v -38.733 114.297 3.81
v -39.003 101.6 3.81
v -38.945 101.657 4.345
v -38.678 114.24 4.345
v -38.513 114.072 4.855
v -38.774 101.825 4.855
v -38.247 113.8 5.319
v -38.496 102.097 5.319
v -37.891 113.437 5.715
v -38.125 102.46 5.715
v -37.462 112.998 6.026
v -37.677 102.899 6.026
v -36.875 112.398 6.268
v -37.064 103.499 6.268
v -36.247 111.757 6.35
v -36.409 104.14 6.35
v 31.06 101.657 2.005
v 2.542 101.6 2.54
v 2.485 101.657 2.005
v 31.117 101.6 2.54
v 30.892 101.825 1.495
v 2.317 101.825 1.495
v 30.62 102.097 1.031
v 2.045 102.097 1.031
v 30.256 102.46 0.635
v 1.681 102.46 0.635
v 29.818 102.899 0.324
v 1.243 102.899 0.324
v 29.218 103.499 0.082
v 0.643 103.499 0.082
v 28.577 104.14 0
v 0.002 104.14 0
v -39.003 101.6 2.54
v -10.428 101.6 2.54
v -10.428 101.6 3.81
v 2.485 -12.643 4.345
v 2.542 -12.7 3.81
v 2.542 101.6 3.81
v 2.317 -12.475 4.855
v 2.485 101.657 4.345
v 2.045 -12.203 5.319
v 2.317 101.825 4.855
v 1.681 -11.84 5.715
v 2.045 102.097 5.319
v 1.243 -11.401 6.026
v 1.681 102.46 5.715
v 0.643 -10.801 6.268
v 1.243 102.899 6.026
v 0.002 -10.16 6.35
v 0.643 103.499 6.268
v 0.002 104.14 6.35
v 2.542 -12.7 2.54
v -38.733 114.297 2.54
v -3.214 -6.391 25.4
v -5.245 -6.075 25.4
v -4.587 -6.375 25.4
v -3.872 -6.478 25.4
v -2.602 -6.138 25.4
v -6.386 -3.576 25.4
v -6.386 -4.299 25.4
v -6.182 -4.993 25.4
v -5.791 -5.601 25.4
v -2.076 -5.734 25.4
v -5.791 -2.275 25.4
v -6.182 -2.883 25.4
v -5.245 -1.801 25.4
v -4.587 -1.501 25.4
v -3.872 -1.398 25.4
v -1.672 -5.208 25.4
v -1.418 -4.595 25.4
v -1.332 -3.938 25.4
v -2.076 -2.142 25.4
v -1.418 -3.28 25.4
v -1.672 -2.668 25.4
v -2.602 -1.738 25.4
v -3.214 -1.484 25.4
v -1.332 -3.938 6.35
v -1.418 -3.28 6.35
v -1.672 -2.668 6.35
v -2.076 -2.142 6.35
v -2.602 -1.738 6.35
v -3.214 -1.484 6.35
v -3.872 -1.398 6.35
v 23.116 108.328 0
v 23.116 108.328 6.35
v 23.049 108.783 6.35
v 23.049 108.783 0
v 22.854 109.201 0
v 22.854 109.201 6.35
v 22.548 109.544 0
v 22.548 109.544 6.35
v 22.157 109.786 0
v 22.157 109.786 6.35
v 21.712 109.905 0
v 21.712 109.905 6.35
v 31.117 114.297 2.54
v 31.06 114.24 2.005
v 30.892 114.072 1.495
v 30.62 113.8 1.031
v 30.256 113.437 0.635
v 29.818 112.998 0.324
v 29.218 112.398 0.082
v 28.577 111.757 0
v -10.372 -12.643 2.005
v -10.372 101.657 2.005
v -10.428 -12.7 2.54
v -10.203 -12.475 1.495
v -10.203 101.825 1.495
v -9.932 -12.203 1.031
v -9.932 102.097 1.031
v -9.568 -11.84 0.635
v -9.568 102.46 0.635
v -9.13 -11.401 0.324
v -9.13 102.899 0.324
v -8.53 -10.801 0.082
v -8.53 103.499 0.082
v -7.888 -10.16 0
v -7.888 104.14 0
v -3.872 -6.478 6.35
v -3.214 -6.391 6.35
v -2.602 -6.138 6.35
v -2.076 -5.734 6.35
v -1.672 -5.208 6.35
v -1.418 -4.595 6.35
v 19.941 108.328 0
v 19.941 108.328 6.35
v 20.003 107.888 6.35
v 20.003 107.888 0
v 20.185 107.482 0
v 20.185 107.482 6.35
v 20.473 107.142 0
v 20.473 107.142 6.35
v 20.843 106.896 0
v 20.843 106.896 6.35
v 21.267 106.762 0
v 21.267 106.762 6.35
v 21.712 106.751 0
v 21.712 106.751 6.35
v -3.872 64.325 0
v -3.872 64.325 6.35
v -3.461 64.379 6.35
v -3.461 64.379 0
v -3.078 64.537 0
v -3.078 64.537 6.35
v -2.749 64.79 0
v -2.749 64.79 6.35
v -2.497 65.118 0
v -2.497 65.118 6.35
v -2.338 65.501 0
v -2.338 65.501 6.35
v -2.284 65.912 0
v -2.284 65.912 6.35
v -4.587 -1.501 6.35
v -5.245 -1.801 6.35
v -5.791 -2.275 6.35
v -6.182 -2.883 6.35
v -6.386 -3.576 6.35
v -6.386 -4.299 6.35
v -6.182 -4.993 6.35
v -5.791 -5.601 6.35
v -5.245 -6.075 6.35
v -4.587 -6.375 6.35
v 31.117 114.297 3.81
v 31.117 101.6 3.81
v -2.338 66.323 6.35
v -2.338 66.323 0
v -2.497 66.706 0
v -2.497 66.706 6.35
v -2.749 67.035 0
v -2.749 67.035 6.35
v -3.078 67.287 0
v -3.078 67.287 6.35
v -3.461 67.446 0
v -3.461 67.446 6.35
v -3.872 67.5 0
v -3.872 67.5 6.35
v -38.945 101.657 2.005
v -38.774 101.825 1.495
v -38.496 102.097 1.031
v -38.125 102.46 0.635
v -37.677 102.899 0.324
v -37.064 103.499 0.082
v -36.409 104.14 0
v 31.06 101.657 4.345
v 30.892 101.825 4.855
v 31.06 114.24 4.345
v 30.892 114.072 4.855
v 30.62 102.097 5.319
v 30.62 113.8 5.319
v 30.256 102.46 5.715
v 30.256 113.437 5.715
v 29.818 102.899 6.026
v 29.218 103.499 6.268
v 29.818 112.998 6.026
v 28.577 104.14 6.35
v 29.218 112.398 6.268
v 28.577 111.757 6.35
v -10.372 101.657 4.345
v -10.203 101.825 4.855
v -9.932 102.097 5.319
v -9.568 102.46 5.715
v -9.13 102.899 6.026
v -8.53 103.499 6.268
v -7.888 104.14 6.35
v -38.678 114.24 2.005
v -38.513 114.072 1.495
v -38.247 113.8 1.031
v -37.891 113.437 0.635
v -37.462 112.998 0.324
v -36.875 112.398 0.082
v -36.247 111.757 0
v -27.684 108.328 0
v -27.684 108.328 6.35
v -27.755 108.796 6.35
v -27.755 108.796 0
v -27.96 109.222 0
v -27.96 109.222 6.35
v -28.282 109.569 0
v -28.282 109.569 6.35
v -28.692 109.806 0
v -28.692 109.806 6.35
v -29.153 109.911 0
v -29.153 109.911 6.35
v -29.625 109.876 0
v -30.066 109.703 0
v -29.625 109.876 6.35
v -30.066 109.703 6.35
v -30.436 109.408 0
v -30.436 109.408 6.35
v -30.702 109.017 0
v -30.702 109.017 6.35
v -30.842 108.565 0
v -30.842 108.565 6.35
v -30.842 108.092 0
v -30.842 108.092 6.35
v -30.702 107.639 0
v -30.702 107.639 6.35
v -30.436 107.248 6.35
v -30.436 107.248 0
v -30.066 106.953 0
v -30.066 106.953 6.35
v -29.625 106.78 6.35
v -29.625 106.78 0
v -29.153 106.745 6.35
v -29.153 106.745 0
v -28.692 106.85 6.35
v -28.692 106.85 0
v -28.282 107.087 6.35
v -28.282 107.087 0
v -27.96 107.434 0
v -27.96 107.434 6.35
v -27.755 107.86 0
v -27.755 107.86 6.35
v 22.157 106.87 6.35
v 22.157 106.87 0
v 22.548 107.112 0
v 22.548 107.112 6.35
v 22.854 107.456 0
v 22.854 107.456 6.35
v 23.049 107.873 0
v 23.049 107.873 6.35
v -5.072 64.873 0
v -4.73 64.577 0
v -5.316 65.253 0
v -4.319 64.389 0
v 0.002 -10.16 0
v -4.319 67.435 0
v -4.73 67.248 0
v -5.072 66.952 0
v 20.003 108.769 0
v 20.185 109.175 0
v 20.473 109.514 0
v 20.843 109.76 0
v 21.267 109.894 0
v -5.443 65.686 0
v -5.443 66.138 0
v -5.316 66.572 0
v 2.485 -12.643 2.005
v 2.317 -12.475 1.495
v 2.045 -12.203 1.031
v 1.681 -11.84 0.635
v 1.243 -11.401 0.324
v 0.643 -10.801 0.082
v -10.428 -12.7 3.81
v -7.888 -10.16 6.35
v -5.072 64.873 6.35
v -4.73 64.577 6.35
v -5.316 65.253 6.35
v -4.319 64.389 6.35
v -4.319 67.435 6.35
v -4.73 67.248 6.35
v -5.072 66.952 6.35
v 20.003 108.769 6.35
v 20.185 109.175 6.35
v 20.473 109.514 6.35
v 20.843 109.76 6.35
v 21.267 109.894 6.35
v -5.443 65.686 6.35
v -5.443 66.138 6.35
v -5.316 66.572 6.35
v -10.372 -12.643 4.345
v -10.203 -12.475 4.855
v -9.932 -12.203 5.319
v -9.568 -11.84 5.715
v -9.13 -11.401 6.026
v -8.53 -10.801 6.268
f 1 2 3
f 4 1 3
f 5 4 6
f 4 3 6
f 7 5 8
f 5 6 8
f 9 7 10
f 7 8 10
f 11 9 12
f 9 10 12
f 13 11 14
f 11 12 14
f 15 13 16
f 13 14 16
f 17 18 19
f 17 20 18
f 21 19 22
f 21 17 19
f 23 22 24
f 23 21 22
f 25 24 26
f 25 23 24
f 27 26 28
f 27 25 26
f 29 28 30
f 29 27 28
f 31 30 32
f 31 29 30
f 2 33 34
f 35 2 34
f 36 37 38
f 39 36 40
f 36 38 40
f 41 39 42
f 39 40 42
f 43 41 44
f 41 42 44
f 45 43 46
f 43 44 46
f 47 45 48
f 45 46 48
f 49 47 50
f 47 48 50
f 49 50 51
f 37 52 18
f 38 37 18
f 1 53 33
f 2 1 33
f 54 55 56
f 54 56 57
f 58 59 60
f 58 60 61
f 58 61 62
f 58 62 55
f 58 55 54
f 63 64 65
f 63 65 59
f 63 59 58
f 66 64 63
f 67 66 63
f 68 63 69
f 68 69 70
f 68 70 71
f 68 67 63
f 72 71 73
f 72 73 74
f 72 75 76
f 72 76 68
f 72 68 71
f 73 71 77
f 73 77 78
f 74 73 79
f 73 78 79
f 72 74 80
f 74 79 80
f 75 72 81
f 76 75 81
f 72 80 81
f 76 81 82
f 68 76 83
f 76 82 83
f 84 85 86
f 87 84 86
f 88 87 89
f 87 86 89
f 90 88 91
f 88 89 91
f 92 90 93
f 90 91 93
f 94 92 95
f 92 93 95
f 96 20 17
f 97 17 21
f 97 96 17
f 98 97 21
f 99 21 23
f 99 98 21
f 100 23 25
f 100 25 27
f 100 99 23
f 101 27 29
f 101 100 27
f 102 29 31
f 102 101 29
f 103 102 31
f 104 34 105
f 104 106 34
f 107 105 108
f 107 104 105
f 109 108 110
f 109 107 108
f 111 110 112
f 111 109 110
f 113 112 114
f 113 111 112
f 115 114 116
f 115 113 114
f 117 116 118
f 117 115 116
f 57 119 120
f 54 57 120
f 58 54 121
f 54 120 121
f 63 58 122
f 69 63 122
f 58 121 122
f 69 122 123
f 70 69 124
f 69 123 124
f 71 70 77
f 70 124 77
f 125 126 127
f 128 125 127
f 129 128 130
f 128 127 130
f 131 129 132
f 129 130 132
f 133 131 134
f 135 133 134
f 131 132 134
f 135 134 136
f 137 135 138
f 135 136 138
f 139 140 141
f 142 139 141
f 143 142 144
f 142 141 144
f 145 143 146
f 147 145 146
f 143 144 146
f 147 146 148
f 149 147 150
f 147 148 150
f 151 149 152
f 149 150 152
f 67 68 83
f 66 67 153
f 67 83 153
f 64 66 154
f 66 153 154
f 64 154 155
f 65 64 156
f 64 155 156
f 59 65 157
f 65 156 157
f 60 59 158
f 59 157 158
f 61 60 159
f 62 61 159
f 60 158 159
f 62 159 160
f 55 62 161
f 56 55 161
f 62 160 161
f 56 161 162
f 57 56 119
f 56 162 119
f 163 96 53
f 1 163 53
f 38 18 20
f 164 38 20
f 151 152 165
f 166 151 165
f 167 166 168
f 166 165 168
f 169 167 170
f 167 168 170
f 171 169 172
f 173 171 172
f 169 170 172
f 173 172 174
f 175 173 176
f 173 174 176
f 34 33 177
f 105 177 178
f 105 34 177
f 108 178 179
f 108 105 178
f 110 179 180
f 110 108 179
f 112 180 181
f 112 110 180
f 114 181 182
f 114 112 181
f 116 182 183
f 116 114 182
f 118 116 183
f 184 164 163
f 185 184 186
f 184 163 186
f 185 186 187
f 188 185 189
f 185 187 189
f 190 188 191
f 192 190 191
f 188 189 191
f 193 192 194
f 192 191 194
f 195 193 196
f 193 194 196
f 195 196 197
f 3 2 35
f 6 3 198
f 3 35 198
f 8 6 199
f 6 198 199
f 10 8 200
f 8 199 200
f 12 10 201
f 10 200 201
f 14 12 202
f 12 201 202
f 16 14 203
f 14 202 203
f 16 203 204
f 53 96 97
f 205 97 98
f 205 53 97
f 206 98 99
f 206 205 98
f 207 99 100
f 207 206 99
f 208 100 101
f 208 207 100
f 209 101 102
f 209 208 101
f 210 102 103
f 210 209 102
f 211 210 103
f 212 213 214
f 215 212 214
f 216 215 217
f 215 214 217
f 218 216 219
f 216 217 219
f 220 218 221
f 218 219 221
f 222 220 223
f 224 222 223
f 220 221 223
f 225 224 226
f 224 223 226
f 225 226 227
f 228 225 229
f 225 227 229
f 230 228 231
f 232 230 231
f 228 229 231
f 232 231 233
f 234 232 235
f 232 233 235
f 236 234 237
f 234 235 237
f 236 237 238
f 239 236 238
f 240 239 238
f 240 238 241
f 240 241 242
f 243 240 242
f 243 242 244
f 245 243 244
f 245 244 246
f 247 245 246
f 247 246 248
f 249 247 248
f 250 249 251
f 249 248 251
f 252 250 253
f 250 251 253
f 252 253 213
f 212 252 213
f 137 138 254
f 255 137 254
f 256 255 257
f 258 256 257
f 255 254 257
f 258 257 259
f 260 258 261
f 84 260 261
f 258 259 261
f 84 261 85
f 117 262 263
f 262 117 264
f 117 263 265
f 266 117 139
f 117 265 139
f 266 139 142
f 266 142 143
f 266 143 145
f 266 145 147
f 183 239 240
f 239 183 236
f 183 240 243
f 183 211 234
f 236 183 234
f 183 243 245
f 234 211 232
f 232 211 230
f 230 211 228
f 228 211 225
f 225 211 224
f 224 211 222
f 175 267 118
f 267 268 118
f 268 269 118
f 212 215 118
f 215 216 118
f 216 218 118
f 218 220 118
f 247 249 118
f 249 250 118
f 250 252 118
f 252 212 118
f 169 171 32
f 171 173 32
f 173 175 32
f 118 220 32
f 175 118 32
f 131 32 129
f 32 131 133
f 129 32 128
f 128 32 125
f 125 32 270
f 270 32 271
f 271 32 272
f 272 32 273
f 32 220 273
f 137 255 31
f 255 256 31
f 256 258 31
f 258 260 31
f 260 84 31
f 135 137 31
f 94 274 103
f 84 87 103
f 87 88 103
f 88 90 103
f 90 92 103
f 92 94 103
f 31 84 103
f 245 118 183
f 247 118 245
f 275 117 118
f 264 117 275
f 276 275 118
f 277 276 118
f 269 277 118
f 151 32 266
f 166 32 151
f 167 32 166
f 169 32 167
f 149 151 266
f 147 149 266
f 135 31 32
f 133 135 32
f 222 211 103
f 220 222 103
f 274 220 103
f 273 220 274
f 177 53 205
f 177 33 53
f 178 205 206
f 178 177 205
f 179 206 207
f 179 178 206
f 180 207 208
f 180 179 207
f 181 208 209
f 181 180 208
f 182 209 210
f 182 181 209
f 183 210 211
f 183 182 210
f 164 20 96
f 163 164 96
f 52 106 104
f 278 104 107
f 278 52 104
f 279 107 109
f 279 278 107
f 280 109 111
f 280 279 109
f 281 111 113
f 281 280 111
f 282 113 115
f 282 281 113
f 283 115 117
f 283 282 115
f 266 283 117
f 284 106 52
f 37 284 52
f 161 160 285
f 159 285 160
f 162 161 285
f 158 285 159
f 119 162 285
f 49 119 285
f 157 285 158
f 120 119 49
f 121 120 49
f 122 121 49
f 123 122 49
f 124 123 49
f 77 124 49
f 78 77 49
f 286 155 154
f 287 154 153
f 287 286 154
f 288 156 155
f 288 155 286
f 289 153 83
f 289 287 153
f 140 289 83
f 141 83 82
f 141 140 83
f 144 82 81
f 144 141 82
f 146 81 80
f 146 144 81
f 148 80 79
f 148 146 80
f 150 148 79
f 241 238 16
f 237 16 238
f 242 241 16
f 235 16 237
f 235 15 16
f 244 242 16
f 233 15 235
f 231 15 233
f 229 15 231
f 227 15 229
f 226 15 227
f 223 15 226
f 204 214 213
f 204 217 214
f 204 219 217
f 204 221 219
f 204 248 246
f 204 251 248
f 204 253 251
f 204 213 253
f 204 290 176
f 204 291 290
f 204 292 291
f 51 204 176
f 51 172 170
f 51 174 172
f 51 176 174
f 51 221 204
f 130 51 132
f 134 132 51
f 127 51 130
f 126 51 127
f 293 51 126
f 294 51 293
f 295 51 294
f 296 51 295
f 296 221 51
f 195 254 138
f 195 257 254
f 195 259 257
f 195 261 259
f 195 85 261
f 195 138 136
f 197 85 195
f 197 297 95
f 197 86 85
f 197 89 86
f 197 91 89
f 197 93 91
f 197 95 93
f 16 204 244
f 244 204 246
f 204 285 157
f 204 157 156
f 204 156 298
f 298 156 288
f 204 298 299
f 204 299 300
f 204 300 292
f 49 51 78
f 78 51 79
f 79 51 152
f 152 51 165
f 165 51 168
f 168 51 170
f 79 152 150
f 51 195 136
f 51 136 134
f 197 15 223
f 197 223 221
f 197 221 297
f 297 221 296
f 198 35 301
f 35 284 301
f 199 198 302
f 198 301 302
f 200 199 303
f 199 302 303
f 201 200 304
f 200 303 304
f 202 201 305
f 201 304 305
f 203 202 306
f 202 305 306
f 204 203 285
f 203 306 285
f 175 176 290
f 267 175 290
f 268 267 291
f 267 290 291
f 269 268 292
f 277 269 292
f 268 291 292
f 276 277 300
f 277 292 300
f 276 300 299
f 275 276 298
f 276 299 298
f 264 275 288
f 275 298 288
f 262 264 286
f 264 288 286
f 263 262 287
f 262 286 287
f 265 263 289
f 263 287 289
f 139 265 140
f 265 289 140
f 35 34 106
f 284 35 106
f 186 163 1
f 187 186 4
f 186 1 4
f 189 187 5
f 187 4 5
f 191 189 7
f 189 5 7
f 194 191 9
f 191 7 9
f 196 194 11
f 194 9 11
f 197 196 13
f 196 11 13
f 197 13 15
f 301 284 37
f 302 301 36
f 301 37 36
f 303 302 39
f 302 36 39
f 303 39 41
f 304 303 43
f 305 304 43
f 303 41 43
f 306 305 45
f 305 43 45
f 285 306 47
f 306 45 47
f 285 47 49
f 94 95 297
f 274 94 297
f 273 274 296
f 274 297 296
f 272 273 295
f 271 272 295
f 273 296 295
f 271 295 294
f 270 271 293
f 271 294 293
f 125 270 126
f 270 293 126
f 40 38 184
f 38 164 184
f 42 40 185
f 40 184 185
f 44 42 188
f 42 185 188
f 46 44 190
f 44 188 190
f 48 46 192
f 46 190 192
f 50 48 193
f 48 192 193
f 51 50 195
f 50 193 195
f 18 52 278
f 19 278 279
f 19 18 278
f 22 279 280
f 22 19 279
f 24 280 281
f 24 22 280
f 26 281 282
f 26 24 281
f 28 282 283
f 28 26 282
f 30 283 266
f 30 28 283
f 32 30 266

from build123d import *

# Parameters (mm, degrees)
F1_DEPTH = 6.35
F3_R     = 2.54
F4_DEPTH = 6.35
F5_DEPTH = 6.35
F6_DEPTH = 6.35
F7_DEPTH = 19.05


with BuildPart() as f1:
    # F0 (on Top) → F1 (new body)
    with BuildSketch(Plane.XY):
        Polygon((31.1166602765, 114.2971263717), (-38.7333397235, 114.2971263717), (-39.0034913485, 101.6), (-10.4284913485, 101.6), (-10.4284913485, -12.7), (2.5416602765, -12.7), (2.5416602765, 101.6), (31.1166602765, 101.6), align=None)
    extrude(amount=F1_DEPTH)

    # F3
    f3_edges = [f1.edges().sort_by_distance(p)[0] for p in [
        (-24.715991, 101.6, 6.35),
        (-38.868416, 107.948563, 6.35),
        (-3.80834, 114.297126, 6.35),
        (16.82916, 101.6, 6.35),
        (31.11666, 107.948563, 6.35),
        (2.54166, 44.45, 6.35),
        (-10.428491, 44.45, 6.35),
        (-3.943416, -12.7, 6.35),
        (-24.715991, 101.6, 0),
        (-38.868416, 107.948563, 0),
        (-3.80834, 114.297126, 0),
        (16.82916, 101.6, 0),
        (31.11666, 107.948563, 0),
        (2.54166, 44.45, 0),
        (-10.428491, 44.45, 0),
        (-3.943416, -12.7, 0),
    ]]
    fillet(f3_edges, radius=F3_R)

    # F2 (on face) → F4 (cut)
    with BuildSketch(Plane.XY.offset(6.35)):
        with BuildLine():
            Line((-27.6843397235, 108.3281263717), (-29.2718397235, 108.3281263717))
            Line((-29.2718397235, 108.3281263717), (-30.8593397235, 108.3281263717))
            ThreePointArc((-30.8593397235, 108.3281263717), (-29.2718397235, 106.7406263717), (-27.6843397235, 108.3281263717))
        make_face()
        with BuildLine():
            Line((-30.8593397235, 108.3281263717), (-29.2718397235, 108.3281263717))
            Line((-29.2718397235, 108.3281263717), (-27.6843397235, 108.3281263717))
            ThreePointArc((-27.6843397235, 108.3281263717), (-29.2718397235, 109.9156263717), (-30.8593397235, 108.3281263717))
        make_face()
    extrude(amount=-F4_DEPTH, mode=Mode.SUBTRACT)

    # F2 (on face) → F5 (cut)
    with BuildSketch(Plane.XY.offset(6.35)):
        with BuildLine():
            ThreePointArc((21.7121915103, 109.904923364), (20.4726967133, 109.5139395597), (19.9406602765, 108.3281263717))
            Line((19.9406602765, 108.3281263717), (21.5281602765, 108.3281263717))
            Line((21.5281602765, 108.3281263717), (21.7121915103, 108.3281263717))
            Line((21.7121915103, 108.3281263717), (21.7121915103, 109.904923364))
        make_face()
        with BuildLine():
            ThreePointArc((23.1156602765, 108.3281263717), (22.7139734645, 109.3835899349), (21.7121915103, 109.904923364))
            Line((21.7121915103, 109.904923364), (21.7121915103, 108.3281263717))
            Line((21.7121915103, 108.3281263717), (23.1156602765, 108.3281263717))
        make_face()
        with BuildLine():
            Line((21.7121915103, 108.3281263717), (21.7121915103, 106.7513293794))
            ThreePointArc((21.7121915103, 106.7513293794), (22.7139734645, 107.2726628086), (23.1156602765, 108.3281263717))
            Line((23.1156602765, 108.3281263717), (21.7121915103, 108.3281263717))
        make_face()
        with BuildLine():
            Line((21.5281602765, 108.3281263717), (19.9406602765, 108.3281263717))
            ThreePointArc((19.9406602765, 108.3281263717), (20.4726967133, 107.1423131837), (21.7121915103, 106.7513293794))
            Line((21.7121915103, 106.7513293794), (21.7121915103, 108.3281263717))
            Line((21.7121915103, 108.3281263717), (21.5281602765, 108.3281263717))
        make_face()
    extrude(amount=-F5_DEPTH, mode=Mode.SUBTRACT)

    # F2 (on face) → F6 (cut)
    with BuildSketch(Plane.XY.offset(6.35)):
        with BuildLine():
            Line((-3.8718397235, 65.912123364), (-3.8718397235, 67.499623364))
            ThreePointArc((-3.8718397235, 67.499623364), (-5.4593397235, 65.912123364), (-3.8718397235, 64.324623364))
            Line((-3.8718397235, 64.324623364), (-3.8718397235, 65.912123364))
        make_face()
        with BuildLine():
            ThreePointArc((-2.2843397235, 65.912123364), (-2.7493077084, 67.0346553792), (-3.8718397235, 67.499623364))
            Line((-3.8718397235, 67.499623364), (-3.8718397235, 65.912123364))
            Line((-3.8718397235, 65.912123364), (-2.2843397235, 65.912123364))
        make_face()
        with BuildLine():
            ThreePointArc((-3.8718397235, 64.324623364), (-2.7493077084, 64.7895913489), (-2.2843397235, 65.912123364))
            Line((-2.2843397235, 65.912123364), (-3.8718397235, 65.912123364))
            Line((-3.8718397235, 65.912123364), (-3.8718397235, 64.324623364))
        make_face()
    extrude(amount=-F6_DEPTH, mode=Mode.SUBTRACT)

    # F2 (on face) → F7 (join)
    with BuildSketch(Plane.XY.offset(6.35)):
        with BuildLine():
            Line((-3.8718397235, -3.937876636), (-3.8718397235, -1.397876636))
            ThreePointArc((-3.8718397235, -1.397876636), (-6.4118397235, -3.937876636), (-3.8718397235, -6.477876636))
            Line((-3.8718397235, -6.477876636), (-3.8718397235, -3.937876636))
        make_face()
        with BuildLine():
            ThreePointArc((-1.3318397235, -3.937876636), (-2.0757884993, -2.1418254117), (-3.8718397235, -1.397876636))
            Line((-3.8718397235, -1.397876636), (-3.8718397235, -3.937876636))
            Line((-3.8718397235, -3.937876636), (-1.3318397235, -3.937876636))
        make_face()
        with BuildLine():
            Line((-1.3318397235, -3.937876636), (-3.8718397235, -3.937876636))
            Line((-3.8718397235, -3.937876636), (-3.8718397235, -6.477876636))
            ThreePointArc((-3.8718397235, -6.477876636), (-2.0757884993, -5.7339278602), (-1.3318397235, -3.937876636))
        make_face()
    extrude(amount=F7_DEPTH)


solid = f1.part
